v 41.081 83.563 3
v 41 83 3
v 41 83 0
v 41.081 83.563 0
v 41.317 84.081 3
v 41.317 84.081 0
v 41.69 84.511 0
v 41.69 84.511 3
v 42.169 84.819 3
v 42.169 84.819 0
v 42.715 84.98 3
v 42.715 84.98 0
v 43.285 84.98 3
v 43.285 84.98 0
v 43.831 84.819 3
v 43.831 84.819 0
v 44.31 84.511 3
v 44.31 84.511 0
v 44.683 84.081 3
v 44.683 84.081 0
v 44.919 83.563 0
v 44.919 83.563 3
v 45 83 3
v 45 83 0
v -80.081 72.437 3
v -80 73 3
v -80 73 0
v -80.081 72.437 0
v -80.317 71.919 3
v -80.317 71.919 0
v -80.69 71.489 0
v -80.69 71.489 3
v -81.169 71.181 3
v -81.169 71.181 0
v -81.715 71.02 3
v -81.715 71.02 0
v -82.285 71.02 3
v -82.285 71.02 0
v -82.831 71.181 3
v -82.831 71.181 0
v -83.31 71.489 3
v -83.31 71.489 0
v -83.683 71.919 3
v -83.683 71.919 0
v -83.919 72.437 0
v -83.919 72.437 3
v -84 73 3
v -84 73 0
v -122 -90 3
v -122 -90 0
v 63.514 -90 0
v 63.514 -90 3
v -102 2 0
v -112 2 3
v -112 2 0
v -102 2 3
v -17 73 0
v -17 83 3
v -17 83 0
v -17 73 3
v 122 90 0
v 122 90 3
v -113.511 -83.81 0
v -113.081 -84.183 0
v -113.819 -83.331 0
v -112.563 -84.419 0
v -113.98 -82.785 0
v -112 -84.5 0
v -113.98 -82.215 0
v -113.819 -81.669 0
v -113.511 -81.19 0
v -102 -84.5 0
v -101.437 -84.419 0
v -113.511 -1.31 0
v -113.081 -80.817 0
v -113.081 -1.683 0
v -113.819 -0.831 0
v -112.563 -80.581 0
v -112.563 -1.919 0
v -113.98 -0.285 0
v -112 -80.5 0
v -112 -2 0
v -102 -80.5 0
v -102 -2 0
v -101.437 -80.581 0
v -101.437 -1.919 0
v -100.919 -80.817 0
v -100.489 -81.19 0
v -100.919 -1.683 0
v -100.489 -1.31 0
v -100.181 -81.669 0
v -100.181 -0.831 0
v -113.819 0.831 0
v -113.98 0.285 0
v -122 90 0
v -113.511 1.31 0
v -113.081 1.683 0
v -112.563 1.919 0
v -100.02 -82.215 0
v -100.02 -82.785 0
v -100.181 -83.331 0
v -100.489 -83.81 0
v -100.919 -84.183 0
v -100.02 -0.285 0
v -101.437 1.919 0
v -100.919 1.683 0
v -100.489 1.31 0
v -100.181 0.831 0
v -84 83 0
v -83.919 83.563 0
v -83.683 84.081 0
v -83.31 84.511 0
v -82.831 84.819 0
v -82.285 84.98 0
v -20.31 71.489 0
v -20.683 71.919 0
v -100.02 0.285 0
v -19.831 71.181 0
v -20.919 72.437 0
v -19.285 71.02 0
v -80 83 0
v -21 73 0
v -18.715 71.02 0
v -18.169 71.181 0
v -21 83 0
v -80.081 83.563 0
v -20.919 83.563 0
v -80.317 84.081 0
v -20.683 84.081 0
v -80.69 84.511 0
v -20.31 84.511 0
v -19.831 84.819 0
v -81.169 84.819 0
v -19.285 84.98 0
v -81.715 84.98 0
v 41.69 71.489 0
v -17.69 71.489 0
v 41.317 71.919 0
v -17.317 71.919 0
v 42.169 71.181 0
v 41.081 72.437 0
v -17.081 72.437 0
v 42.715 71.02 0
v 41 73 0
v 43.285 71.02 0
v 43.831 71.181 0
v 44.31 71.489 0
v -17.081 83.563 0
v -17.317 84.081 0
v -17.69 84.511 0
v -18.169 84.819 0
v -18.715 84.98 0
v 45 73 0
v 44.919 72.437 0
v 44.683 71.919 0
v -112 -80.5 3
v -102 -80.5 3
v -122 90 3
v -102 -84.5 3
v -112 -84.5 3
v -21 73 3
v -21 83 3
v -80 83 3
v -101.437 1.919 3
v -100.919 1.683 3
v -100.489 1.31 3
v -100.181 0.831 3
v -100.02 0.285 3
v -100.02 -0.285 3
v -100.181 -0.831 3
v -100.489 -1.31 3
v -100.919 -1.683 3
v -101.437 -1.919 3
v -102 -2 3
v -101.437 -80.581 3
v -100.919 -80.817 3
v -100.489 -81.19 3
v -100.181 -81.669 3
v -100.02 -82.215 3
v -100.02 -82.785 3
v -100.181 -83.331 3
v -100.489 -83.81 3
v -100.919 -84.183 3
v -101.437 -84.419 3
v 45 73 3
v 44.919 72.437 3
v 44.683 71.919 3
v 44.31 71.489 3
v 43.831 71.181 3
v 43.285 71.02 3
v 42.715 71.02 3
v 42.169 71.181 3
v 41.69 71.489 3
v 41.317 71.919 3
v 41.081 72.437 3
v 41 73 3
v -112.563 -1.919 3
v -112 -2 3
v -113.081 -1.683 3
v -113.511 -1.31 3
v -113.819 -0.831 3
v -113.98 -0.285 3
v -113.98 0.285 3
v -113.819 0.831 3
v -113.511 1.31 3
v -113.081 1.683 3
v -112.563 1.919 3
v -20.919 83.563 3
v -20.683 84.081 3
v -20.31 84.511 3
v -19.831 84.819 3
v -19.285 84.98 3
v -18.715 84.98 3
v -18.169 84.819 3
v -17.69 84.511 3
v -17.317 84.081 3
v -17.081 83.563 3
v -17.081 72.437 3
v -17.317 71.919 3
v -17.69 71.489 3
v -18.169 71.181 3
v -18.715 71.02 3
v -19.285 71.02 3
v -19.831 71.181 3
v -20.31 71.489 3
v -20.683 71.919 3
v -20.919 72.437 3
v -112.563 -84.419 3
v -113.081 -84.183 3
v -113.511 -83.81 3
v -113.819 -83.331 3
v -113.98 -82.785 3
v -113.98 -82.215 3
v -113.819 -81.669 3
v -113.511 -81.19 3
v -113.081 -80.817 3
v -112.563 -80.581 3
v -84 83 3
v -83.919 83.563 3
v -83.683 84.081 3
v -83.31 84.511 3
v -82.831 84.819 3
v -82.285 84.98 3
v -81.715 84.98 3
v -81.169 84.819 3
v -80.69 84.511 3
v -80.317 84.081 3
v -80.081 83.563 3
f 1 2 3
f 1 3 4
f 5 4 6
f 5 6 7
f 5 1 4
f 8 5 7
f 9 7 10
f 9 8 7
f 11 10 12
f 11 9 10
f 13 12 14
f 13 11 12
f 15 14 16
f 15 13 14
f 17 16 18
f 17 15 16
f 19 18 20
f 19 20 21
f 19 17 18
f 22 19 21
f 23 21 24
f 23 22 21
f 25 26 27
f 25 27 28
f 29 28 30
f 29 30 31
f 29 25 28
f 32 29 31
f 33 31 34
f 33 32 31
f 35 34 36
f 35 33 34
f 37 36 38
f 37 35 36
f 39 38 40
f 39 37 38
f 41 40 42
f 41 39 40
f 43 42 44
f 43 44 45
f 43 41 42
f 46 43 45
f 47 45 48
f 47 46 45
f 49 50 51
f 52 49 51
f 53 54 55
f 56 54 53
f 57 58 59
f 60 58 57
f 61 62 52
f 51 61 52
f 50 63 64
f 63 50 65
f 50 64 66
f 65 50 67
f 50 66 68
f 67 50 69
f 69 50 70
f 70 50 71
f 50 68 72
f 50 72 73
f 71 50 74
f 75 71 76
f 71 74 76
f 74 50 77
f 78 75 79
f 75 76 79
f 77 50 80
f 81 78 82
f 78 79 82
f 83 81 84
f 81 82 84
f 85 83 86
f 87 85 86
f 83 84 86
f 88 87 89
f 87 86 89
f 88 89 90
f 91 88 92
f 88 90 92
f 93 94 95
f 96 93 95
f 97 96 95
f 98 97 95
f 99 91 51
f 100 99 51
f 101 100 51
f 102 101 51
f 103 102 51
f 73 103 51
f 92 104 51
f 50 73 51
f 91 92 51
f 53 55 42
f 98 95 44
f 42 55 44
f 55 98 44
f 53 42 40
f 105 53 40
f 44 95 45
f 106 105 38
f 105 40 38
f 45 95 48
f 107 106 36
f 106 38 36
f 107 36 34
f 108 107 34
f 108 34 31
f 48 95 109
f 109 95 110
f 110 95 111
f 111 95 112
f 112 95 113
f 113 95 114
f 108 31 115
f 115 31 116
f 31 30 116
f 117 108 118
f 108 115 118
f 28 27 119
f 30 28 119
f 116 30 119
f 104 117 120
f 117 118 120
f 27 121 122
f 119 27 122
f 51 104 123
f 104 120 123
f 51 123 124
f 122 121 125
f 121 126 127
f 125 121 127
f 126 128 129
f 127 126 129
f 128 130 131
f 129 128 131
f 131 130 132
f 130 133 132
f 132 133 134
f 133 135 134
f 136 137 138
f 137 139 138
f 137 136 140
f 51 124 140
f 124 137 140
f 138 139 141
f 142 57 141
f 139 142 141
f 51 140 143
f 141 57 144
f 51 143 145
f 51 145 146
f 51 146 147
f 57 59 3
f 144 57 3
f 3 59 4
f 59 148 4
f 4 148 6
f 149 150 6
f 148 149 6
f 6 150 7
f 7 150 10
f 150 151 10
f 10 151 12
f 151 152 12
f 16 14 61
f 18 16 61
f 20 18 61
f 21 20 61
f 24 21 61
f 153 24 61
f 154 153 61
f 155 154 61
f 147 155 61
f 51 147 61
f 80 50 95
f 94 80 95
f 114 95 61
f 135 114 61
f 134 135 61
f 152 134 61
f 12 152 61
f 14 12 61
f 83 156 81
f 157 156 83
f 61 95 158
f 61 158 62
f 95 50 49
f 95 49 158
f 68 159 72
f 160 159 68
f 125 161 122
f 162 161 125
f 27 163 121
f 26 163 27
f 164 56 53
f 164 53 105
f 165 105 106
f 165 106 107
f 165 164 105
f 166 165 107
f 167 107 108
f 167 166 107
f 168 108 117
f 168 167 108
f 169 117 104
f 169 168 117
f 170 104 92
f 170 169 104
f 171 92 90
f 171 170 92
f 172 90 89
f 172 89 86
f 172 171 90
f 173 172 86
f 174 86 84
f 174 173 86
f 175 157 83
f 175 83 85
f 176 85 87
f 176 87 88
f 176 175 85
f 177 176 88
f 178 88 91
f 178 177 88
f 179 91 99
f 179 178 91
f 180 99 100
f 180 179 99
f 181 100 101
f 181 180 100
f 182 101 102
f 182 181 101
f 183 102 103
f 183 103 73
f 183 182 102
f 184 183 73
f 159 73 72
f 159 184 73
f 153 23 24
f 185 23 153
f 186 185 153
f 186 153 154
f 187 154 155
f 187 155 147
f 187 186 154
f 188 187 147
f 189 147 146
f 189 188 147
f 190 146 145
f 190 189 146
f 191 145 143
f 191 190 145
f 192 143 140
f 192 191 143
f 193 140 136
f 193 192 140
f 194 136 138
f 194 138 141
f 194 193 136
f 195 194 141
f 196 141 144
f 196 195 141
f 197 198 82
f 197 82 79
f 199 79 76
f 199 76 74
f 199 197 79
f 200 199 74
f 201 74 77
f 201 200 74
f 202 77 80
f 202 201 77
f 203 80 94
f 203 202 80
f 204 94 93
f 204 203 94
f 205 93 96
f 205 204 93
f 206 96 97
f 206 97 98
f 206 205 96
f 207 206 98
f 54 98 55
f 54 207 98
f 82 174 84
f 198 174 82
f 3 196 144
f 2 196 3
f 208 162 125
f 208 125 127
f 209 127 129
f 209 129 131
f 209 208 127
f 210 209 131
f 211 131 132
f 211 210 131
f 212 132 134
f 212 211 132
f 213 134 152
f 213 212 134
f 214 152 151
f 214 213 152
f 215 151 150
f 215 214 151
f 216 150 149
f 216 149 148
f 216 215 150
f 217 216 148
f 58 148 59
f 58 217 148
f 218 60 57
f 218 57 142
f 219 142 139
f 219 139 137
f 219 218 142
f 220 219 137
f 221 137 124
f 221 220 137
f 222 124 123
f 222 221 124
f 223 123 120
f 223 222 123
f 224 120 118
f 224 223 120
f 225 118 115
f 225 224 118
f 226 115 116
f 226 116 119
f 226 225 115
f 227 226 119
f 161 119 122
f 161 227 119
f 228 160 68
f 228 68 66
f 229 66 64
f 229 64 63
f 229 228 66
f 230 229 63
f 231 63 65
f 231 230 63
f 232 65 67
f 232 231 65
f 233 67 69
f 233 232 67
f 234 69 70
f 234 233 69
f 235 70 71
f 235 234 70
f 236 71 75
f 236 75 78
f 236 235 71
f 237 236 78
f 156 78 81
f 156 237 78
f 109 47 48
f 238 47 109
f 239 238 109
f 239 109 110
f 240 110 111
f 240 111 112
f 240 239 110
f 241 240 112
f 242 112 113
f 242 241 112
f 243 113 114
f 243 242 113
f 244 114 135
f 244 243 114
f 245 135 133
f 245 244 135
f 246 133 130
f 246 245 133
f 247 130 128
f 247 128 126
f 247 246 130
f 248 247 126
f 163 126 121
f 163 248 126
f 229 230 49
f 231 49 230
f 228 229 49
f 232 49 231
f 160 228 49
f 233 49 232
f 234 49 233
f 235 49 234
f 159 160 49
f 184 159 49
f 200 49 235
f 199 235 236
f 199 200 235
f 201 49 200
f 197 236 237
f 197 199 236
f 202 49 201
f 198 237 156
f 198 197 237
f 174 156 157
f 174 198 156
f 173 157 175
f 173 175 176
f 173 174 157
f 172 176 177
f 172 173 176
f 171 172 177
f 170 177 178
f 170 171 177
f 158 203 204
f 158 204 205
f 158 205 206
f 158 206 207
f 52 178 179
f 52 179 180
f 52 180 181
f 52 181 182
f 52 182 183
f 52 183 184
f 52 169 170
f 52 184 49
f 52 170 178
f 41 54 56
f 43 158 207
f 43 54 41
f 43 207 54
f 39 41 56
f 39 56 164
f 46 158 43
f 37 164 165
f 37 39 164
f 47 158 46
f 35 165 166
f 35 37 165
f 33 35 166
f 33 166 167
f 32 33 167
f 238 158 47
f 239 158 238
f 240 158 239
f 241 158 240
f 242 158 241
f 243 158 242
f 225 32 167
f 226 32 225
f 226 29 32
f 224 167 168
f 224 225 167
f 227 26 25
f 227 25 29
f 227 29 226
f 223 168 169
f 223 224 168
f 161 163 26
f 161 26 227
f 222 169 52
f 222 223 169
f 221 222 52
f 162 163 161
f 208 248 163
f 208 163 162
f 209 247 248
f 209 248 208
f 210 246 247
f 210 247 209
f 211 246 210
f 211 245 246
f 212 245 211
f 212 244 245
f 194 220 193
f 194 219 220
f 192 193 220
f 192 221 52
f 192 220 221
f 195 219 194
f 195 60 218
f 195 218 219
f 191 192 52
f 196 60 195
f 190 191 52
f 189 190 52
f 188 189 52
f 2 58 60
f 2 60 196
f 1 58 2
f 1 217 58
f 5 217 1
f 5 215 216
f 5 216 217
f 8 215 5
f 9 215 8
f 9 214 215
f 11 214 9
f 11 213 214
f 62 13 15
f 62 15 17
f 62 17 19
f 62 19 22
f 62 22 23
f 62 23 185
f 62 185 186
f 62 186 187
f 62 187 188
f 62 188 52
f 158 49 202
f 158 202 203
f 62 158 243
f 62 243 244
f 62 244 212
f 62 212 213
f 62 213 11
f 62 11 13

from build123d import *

# Parameters (mm, degrees)
SKETCH1_W           = 244
SKETCH1_H           = 180
BOSS_EXTRUDE1_DEPTH = 3
CUT_EXTRUDE1_DEPTH  = 3
CUT_EXTRUDE2_DEPTH  = 3


with BuildPart() as part:
    # Sketch1 → Boss-Extrude1 (new body)
    with BuildSketch(Plane.XY):
        Rectangle(SKETCH1_W, SKETCH1_H)
    extrude(amount=BOSS_EXTRUDE1_DEPTH)

    # Sketch2 → Cut-Extrude1 (cut)
    with BuildSketch(Plane.XY.offset(3)):
        Polygon((122, 90), (63.514454678, -90), (122, -90), align=None)
    extrude(amount=-CUT_EXTRUDE1_DEPTH, mode=Mode.SUBTRACT)

    # Sketch3 → Cut-Extrude2 (cut)
    with BuildSketch(Plane.XY.offset(3)):
        with BuildLine():
            Line((-80, 83), (-80, 73))
            ThreePointArc((-80, 73), (-82, 71), (-84, 73))
            Line((-84, 73), (-84, 83))
            ThreePointArc((-84, 83), (-82, 85), (-80, 83))
        make_face()
        with BuildLine():
            Line((-17, 83), (-17, 73))
            ThreePointArc((-17, 73), (-19, 71), (-21, 73))
            Line((-21, 73), (-21, 83))
            ThreePointArc((-21, 83), (-19, 85), (-17, 83))
        make_face()
        with BuildLine():
            Line((45, 83), (45, 73))
            ThreePointArc((45, 73), (43, 71), (41, 73))
            Line((41, 73), (41, 83))
            ThreePointArc((41, 83), (43, 85), (45, 83))
        make_face()
        with BuildLine():
            Line((-112, 2), (-102, 2))
            ThreePointArc((-102, 2), (-100, 0), (-102, -2))
            Line((-102, -2), (-112, -2))
            ThreePointArc((-112, -2), (-114, 0), (-112, 2))
        make_face()
        with BuildLine():
            Line((-112, -80.5), (-102, -80.5))
            ThreePointArc((-102, -80.5), (-100, -82.5), (-102, -84.5))
            Line((-102, -84.5), (-112, -84.5))
            ThreePointArc((-112, -84.5), (-114, -82.5), (-112, -80.5))
        make_face()
    extrude(amount=-CUT_EXTRUDE2_DEPTH, mode=Mode.SUBTRACT)


solid = part.part
